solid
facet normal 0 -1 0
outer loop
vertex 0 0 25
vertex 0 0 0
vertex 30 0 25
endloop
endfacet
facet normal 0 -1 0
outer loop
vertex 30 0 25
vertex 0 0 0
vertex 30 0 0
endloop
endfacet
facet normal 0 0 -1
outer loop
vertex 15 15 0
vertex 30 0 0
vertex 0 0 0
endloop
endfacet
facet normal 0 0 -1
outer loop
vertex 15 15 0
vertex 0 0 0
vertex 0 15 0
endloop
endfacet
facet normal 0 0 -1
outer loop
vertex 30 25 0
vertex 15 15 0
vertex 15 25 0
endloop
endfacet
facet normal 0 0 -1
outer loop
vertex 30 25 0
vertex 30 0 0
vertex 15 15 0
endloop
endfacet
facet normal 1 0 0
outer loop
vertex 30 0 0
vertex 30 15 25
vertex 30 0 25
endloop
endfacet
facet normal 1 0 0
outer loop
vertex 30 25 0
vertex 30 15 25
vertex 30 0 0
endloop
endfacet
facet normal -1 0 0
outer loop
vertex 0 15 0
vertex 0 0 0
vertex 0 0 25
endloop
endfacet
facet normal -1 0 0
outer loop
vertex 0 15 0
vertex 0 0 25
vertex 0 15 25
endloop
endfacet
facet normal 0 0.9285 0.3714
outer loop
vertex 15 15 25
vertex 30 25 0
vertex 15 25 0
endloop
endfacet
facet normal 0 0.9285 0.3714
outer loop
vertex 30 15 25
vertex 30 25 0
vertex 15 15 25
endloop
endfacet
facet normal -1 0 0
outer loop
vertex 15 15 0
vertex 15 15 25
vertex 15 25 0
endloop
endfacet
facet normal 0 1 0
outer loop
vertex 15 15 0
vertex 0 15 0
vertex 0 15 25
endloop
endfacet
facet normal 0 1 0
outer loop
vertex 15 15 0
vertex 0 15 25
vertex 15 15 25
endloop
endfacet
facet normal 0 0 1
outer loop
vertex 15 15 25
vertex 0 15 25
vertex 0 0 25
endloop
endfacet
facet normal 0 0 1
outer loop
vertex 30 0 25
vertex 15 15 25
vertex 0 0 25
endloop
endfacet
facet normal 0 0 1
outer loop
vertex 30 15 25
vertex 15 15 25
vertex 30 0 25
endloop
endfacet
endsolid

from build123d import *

# Parameters (mm, degrees)
SKETCH1_W           = 30
SKETCH1_H           = 15
BOSS_EXTRUDE1_DEPTH = 25
BOSS_EXTRUDE2_DEPTH = 15


with BuildPart() as part:
    # Sketch1 → Boss-Extrude1 (new body)
    with BuildSketch(Plane.XY):
        with Locations((15, 7.5)):
            Rectangle(SKETCH1_W, SKETCH1_H)
    extrude(amount=BOSS_EXTRUDE1_DEPTH)

    # Sketch2 → Boss-Extrude2 (add)
    with BuildSketch(Plane(origin=(30, 0, 0), x_dir=(0, 0, -1), z_dir=(1, 0, 0))):
        Polygon((0, 15), (0, 25), (-25, 15), align=None)
    extrude(amount=-BOSS_EXTRUDE2_DEPTH)


solid = part.part
